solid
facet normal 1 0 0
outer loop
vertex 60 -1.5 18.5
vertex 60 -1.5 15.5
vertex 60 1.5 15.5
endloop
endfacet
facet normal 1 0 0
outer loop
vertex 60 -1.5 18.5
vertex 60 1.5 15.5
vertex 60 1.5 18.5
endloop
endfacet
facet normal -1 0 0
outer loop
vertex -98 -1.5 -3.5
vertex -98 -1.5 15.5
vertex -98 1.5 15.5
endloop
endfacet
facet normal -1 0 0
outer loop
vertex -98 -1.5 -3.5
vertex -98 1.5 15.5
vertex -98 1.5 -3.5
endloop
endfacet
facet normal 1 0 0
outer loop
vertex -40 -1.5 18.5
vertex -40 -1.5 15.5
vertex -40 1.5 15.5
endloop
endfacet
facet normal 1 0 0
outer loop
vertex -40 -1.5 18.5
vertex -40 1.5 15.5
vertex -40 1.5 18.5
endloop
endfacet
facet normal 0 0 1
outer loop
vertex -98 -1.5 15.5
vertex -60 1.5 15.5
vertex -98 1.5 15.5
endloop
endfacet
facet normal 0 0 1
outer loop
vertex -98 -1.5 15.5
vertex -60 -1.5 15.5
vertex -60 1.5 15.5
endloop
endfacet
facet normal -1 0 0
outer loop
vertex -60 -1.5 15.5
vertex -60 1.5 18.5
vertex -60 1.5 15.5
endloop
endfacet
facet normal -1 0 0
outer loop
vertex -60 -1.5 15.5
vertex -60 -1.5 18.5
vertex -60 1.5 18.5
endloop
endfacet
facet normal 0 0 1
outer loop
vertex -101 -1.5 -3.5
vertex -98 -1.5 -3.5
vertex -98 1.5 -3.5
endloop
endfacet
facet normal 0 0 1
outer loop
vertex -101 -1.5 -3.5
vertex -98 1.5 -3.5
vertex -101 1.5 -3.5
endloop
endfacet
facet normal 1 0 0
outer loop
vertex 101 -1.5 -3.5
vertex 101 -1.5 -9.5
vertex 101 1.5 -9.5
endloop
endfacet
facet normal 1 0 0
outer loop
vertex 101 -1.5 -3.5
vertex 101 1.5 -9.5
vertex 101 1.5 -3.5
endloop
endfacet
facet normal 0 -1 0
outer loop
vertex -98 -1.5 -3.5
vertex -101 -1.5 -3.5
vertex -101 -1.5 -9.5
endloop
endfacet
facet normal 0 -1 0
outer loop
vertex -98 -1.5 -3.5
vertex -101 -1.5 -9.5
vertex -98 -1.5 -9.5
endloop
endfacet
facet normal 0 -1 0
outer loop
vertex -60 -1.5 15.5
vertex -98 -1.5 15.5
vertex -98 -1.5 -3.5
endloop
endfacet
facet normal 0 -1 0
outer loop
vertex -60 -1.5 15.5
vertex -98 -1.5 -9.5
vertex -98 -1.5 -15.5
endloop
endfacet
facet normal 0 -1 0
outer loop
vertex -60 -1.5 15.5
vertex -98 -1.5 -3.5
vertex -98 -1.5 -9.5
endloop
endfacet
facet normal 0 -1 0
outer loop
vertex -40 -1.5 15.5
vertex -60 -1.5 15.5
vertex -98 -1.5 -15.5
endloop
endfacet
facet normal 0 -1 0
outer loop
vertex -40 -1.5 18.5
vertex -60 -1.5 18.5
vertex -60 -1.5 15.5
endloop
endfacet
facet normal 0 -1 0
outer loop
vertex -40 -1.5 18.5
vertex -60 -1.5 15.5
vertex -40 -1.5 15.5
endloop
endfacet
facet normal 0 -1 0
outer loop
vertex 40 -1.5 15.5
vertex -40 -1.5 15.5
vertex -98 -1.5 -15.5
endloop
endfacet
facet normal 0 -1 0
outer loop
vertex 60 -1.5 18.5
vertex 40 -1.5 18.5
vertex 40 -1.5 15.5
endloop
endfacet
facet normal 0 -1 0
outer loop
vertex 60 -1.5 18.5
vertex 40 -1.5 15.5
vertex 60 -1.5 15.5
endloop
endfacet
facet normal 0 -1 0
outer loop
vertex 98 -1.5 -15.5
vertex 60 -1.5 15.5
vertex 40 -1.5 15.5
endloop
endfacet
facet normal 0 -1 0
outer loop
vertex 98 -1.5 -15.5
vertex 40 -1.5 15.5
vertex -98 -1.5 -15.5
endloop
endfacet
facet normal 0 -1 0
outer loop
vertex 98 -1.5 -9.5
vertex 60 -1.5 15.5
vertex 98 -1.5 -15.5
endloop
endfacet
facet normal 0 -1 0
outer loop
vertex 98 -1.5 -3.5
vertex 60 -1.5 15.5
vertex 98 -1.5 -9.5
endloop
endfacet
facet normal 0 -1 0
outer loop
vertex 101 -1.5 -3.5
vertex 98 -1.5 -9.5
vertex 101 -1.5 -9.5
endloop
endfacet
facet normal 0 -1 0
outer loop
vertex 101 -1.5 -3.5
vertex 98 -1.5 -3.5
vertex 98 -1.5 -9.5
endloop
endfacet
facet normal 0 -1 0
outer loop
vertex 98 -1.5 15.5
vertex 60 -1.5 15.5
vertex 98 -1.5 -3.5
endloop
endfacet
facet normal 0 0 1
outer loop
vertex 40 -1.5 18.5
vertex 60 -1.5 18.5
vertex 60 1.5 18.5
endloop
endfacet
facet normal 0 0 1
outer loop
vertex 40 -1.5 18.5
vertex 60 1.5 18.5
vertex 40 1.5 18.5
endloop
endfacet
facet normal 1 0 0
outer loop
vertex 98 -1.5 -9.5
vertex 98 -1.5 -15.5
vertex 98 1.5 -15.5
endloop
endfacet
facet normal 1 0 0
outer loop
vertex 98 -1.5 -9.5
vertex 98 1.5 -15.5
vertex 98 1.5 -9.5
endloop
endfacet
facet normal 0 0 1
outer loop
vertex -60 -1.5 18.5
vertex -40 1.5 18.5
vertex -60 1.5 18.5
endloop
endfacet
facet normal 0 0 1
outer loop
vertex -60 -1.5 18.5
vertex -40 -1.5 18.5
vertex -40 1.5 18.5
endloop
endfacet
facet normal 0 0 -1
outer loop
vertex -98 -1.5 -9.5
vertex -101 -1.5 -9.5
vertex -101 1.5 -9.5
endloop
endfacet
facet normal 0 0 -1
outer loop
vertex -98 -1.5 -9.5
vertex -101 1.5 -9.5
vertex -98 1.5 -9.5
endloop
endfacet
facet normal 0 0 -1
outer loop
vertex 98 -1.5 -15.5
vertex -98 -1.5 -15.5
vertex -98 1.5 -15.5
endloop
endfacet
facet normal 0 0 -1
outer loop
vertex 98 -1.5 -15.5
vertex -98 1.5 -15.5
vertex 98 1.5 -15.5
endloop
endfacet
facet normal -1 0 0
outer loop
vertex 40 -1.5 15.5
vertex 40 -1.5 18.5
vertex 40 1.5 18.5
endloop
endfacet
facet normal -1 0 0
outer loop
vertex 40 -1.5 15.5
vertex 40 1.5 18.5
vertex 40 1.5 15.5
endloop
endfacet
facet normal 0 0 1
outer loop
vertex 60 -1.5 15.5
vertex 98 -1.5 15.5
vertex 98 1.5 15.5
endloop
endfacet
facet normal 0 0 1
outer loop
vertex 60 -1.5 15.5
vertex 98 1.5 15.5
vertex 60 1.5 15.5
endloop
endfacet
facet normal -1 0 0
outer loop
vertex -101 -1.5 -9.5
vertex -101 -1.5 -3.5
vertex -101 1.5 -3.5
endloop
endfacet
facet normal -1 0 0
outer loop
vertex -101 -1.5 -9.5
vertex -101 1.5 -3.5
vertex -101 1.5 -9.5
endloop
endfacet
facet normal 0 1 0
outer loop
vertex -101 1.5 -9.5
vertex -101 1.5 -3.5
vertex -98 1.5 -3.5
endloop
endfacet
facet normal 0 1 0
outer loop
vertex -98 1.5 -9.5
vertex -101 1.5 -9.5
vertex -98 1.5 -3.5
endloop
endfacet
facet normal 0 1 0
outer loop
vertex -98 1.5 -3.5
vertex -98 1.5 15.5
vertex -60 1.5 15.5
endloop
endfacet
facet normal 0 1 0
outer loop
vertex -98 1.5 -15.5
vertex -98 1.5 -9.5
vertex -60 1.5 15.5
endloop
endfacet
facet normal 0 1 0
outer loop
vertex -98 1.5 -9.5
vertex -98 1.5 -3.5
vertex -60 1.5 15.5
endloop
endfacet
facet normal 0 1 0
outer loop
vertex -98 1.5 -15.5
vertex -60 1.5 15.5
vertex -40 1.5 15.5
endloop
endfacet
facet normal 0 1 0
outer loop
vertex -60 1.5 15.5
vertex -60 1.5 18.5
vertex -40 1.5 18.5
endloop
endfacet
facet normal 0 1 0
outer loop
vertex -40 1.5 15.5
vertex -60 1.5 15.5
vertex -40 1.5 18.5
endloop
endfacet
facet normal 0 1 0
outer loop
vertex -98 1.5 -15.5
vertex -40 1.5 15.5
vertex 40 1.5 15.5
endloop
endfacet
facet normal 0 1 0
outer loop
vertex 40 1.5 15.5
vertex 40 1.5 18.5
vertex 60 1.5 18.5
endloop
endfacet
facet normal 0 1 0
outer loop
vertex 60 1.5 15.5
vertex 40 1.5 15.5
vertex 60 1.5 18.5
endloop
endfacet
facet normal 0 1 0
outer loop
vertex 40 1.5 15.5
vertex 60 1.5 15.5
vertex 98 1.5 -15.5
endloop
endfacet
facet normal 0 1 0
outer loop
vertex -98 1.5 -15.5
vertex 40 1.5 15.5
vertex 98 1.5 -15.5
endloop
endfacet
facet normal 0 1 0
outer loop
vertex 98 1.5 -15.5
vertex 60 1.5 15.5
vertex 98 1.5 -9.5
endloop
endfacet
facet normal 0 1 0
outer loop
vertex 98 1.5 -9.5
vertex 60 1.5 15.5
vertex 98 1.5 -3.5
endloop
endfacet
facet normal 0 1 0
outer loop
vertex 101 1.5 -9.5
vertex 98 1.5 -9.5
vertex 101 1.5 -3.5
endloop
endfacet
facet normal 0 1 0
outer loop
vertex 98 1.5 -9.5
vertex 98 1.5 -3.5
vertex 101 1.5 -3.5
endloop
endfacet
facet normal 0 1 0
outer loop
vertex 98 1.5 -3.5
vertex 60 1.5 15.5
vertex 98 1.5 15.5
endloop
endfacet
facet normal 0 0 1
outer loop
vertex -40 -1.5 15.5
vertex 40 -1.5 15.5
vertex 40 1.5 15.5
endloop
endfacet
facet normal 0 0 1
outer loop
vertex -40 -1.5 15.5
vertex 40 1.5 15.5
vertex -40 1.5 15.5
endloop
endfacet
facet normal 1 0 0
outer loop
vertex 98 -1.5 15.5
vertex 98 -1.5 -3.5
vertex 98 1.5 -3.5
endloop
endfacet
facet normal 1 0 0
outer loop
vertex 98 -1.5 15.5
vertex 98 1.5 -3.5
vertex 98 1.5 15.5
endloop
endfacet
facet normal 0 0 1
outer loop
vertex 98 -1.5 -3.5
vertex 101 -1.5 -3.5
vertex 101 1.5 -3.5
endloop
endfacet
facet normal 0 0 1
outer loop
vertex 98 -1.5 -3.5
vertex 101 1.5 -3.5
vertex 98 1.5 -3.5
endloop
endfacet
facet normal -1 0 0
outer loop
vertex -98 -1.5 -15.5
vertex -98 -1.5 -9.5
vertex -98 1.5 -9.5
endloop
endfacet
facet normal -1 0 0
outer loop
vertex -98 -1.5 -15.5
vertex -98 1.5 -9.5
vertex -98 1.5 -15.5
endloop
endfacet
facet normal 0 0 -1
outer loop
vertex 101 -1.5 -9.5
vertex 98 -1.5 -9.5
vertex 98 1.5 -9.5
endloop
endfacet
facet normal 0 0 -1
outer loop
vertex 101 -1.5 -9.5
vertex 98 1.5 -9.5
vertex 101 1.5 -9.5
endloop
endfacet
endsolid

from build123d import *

# Parameters (mm, degrees)
F1_DEPTH = 1.5


with BuildPart() as f1:
    # F0 (on Front) → F1 (new body, symmetric)
    with BuildSketch(Plane.XZ):
        Polygon((-60, 15.5), (-98, 15.5), (-98, -3.5), (-101, -3.5), (-101, -9.5), (-98, -9.5), (-98, -15.5), (98, -15.5), (98, -9.5), (101, -9.5), (101, -3.5), (98, -3.5), (98, 15.5), (60, 15.5), (60, 18.5), (40, 18.5), (40, 15.5), (0, 15.5), (-40, 15.5), (-40, 18.5), (-60, 18.5), align=None)
    extrude(amount=F1_DEPTH, both=True)


solid = f1.part
